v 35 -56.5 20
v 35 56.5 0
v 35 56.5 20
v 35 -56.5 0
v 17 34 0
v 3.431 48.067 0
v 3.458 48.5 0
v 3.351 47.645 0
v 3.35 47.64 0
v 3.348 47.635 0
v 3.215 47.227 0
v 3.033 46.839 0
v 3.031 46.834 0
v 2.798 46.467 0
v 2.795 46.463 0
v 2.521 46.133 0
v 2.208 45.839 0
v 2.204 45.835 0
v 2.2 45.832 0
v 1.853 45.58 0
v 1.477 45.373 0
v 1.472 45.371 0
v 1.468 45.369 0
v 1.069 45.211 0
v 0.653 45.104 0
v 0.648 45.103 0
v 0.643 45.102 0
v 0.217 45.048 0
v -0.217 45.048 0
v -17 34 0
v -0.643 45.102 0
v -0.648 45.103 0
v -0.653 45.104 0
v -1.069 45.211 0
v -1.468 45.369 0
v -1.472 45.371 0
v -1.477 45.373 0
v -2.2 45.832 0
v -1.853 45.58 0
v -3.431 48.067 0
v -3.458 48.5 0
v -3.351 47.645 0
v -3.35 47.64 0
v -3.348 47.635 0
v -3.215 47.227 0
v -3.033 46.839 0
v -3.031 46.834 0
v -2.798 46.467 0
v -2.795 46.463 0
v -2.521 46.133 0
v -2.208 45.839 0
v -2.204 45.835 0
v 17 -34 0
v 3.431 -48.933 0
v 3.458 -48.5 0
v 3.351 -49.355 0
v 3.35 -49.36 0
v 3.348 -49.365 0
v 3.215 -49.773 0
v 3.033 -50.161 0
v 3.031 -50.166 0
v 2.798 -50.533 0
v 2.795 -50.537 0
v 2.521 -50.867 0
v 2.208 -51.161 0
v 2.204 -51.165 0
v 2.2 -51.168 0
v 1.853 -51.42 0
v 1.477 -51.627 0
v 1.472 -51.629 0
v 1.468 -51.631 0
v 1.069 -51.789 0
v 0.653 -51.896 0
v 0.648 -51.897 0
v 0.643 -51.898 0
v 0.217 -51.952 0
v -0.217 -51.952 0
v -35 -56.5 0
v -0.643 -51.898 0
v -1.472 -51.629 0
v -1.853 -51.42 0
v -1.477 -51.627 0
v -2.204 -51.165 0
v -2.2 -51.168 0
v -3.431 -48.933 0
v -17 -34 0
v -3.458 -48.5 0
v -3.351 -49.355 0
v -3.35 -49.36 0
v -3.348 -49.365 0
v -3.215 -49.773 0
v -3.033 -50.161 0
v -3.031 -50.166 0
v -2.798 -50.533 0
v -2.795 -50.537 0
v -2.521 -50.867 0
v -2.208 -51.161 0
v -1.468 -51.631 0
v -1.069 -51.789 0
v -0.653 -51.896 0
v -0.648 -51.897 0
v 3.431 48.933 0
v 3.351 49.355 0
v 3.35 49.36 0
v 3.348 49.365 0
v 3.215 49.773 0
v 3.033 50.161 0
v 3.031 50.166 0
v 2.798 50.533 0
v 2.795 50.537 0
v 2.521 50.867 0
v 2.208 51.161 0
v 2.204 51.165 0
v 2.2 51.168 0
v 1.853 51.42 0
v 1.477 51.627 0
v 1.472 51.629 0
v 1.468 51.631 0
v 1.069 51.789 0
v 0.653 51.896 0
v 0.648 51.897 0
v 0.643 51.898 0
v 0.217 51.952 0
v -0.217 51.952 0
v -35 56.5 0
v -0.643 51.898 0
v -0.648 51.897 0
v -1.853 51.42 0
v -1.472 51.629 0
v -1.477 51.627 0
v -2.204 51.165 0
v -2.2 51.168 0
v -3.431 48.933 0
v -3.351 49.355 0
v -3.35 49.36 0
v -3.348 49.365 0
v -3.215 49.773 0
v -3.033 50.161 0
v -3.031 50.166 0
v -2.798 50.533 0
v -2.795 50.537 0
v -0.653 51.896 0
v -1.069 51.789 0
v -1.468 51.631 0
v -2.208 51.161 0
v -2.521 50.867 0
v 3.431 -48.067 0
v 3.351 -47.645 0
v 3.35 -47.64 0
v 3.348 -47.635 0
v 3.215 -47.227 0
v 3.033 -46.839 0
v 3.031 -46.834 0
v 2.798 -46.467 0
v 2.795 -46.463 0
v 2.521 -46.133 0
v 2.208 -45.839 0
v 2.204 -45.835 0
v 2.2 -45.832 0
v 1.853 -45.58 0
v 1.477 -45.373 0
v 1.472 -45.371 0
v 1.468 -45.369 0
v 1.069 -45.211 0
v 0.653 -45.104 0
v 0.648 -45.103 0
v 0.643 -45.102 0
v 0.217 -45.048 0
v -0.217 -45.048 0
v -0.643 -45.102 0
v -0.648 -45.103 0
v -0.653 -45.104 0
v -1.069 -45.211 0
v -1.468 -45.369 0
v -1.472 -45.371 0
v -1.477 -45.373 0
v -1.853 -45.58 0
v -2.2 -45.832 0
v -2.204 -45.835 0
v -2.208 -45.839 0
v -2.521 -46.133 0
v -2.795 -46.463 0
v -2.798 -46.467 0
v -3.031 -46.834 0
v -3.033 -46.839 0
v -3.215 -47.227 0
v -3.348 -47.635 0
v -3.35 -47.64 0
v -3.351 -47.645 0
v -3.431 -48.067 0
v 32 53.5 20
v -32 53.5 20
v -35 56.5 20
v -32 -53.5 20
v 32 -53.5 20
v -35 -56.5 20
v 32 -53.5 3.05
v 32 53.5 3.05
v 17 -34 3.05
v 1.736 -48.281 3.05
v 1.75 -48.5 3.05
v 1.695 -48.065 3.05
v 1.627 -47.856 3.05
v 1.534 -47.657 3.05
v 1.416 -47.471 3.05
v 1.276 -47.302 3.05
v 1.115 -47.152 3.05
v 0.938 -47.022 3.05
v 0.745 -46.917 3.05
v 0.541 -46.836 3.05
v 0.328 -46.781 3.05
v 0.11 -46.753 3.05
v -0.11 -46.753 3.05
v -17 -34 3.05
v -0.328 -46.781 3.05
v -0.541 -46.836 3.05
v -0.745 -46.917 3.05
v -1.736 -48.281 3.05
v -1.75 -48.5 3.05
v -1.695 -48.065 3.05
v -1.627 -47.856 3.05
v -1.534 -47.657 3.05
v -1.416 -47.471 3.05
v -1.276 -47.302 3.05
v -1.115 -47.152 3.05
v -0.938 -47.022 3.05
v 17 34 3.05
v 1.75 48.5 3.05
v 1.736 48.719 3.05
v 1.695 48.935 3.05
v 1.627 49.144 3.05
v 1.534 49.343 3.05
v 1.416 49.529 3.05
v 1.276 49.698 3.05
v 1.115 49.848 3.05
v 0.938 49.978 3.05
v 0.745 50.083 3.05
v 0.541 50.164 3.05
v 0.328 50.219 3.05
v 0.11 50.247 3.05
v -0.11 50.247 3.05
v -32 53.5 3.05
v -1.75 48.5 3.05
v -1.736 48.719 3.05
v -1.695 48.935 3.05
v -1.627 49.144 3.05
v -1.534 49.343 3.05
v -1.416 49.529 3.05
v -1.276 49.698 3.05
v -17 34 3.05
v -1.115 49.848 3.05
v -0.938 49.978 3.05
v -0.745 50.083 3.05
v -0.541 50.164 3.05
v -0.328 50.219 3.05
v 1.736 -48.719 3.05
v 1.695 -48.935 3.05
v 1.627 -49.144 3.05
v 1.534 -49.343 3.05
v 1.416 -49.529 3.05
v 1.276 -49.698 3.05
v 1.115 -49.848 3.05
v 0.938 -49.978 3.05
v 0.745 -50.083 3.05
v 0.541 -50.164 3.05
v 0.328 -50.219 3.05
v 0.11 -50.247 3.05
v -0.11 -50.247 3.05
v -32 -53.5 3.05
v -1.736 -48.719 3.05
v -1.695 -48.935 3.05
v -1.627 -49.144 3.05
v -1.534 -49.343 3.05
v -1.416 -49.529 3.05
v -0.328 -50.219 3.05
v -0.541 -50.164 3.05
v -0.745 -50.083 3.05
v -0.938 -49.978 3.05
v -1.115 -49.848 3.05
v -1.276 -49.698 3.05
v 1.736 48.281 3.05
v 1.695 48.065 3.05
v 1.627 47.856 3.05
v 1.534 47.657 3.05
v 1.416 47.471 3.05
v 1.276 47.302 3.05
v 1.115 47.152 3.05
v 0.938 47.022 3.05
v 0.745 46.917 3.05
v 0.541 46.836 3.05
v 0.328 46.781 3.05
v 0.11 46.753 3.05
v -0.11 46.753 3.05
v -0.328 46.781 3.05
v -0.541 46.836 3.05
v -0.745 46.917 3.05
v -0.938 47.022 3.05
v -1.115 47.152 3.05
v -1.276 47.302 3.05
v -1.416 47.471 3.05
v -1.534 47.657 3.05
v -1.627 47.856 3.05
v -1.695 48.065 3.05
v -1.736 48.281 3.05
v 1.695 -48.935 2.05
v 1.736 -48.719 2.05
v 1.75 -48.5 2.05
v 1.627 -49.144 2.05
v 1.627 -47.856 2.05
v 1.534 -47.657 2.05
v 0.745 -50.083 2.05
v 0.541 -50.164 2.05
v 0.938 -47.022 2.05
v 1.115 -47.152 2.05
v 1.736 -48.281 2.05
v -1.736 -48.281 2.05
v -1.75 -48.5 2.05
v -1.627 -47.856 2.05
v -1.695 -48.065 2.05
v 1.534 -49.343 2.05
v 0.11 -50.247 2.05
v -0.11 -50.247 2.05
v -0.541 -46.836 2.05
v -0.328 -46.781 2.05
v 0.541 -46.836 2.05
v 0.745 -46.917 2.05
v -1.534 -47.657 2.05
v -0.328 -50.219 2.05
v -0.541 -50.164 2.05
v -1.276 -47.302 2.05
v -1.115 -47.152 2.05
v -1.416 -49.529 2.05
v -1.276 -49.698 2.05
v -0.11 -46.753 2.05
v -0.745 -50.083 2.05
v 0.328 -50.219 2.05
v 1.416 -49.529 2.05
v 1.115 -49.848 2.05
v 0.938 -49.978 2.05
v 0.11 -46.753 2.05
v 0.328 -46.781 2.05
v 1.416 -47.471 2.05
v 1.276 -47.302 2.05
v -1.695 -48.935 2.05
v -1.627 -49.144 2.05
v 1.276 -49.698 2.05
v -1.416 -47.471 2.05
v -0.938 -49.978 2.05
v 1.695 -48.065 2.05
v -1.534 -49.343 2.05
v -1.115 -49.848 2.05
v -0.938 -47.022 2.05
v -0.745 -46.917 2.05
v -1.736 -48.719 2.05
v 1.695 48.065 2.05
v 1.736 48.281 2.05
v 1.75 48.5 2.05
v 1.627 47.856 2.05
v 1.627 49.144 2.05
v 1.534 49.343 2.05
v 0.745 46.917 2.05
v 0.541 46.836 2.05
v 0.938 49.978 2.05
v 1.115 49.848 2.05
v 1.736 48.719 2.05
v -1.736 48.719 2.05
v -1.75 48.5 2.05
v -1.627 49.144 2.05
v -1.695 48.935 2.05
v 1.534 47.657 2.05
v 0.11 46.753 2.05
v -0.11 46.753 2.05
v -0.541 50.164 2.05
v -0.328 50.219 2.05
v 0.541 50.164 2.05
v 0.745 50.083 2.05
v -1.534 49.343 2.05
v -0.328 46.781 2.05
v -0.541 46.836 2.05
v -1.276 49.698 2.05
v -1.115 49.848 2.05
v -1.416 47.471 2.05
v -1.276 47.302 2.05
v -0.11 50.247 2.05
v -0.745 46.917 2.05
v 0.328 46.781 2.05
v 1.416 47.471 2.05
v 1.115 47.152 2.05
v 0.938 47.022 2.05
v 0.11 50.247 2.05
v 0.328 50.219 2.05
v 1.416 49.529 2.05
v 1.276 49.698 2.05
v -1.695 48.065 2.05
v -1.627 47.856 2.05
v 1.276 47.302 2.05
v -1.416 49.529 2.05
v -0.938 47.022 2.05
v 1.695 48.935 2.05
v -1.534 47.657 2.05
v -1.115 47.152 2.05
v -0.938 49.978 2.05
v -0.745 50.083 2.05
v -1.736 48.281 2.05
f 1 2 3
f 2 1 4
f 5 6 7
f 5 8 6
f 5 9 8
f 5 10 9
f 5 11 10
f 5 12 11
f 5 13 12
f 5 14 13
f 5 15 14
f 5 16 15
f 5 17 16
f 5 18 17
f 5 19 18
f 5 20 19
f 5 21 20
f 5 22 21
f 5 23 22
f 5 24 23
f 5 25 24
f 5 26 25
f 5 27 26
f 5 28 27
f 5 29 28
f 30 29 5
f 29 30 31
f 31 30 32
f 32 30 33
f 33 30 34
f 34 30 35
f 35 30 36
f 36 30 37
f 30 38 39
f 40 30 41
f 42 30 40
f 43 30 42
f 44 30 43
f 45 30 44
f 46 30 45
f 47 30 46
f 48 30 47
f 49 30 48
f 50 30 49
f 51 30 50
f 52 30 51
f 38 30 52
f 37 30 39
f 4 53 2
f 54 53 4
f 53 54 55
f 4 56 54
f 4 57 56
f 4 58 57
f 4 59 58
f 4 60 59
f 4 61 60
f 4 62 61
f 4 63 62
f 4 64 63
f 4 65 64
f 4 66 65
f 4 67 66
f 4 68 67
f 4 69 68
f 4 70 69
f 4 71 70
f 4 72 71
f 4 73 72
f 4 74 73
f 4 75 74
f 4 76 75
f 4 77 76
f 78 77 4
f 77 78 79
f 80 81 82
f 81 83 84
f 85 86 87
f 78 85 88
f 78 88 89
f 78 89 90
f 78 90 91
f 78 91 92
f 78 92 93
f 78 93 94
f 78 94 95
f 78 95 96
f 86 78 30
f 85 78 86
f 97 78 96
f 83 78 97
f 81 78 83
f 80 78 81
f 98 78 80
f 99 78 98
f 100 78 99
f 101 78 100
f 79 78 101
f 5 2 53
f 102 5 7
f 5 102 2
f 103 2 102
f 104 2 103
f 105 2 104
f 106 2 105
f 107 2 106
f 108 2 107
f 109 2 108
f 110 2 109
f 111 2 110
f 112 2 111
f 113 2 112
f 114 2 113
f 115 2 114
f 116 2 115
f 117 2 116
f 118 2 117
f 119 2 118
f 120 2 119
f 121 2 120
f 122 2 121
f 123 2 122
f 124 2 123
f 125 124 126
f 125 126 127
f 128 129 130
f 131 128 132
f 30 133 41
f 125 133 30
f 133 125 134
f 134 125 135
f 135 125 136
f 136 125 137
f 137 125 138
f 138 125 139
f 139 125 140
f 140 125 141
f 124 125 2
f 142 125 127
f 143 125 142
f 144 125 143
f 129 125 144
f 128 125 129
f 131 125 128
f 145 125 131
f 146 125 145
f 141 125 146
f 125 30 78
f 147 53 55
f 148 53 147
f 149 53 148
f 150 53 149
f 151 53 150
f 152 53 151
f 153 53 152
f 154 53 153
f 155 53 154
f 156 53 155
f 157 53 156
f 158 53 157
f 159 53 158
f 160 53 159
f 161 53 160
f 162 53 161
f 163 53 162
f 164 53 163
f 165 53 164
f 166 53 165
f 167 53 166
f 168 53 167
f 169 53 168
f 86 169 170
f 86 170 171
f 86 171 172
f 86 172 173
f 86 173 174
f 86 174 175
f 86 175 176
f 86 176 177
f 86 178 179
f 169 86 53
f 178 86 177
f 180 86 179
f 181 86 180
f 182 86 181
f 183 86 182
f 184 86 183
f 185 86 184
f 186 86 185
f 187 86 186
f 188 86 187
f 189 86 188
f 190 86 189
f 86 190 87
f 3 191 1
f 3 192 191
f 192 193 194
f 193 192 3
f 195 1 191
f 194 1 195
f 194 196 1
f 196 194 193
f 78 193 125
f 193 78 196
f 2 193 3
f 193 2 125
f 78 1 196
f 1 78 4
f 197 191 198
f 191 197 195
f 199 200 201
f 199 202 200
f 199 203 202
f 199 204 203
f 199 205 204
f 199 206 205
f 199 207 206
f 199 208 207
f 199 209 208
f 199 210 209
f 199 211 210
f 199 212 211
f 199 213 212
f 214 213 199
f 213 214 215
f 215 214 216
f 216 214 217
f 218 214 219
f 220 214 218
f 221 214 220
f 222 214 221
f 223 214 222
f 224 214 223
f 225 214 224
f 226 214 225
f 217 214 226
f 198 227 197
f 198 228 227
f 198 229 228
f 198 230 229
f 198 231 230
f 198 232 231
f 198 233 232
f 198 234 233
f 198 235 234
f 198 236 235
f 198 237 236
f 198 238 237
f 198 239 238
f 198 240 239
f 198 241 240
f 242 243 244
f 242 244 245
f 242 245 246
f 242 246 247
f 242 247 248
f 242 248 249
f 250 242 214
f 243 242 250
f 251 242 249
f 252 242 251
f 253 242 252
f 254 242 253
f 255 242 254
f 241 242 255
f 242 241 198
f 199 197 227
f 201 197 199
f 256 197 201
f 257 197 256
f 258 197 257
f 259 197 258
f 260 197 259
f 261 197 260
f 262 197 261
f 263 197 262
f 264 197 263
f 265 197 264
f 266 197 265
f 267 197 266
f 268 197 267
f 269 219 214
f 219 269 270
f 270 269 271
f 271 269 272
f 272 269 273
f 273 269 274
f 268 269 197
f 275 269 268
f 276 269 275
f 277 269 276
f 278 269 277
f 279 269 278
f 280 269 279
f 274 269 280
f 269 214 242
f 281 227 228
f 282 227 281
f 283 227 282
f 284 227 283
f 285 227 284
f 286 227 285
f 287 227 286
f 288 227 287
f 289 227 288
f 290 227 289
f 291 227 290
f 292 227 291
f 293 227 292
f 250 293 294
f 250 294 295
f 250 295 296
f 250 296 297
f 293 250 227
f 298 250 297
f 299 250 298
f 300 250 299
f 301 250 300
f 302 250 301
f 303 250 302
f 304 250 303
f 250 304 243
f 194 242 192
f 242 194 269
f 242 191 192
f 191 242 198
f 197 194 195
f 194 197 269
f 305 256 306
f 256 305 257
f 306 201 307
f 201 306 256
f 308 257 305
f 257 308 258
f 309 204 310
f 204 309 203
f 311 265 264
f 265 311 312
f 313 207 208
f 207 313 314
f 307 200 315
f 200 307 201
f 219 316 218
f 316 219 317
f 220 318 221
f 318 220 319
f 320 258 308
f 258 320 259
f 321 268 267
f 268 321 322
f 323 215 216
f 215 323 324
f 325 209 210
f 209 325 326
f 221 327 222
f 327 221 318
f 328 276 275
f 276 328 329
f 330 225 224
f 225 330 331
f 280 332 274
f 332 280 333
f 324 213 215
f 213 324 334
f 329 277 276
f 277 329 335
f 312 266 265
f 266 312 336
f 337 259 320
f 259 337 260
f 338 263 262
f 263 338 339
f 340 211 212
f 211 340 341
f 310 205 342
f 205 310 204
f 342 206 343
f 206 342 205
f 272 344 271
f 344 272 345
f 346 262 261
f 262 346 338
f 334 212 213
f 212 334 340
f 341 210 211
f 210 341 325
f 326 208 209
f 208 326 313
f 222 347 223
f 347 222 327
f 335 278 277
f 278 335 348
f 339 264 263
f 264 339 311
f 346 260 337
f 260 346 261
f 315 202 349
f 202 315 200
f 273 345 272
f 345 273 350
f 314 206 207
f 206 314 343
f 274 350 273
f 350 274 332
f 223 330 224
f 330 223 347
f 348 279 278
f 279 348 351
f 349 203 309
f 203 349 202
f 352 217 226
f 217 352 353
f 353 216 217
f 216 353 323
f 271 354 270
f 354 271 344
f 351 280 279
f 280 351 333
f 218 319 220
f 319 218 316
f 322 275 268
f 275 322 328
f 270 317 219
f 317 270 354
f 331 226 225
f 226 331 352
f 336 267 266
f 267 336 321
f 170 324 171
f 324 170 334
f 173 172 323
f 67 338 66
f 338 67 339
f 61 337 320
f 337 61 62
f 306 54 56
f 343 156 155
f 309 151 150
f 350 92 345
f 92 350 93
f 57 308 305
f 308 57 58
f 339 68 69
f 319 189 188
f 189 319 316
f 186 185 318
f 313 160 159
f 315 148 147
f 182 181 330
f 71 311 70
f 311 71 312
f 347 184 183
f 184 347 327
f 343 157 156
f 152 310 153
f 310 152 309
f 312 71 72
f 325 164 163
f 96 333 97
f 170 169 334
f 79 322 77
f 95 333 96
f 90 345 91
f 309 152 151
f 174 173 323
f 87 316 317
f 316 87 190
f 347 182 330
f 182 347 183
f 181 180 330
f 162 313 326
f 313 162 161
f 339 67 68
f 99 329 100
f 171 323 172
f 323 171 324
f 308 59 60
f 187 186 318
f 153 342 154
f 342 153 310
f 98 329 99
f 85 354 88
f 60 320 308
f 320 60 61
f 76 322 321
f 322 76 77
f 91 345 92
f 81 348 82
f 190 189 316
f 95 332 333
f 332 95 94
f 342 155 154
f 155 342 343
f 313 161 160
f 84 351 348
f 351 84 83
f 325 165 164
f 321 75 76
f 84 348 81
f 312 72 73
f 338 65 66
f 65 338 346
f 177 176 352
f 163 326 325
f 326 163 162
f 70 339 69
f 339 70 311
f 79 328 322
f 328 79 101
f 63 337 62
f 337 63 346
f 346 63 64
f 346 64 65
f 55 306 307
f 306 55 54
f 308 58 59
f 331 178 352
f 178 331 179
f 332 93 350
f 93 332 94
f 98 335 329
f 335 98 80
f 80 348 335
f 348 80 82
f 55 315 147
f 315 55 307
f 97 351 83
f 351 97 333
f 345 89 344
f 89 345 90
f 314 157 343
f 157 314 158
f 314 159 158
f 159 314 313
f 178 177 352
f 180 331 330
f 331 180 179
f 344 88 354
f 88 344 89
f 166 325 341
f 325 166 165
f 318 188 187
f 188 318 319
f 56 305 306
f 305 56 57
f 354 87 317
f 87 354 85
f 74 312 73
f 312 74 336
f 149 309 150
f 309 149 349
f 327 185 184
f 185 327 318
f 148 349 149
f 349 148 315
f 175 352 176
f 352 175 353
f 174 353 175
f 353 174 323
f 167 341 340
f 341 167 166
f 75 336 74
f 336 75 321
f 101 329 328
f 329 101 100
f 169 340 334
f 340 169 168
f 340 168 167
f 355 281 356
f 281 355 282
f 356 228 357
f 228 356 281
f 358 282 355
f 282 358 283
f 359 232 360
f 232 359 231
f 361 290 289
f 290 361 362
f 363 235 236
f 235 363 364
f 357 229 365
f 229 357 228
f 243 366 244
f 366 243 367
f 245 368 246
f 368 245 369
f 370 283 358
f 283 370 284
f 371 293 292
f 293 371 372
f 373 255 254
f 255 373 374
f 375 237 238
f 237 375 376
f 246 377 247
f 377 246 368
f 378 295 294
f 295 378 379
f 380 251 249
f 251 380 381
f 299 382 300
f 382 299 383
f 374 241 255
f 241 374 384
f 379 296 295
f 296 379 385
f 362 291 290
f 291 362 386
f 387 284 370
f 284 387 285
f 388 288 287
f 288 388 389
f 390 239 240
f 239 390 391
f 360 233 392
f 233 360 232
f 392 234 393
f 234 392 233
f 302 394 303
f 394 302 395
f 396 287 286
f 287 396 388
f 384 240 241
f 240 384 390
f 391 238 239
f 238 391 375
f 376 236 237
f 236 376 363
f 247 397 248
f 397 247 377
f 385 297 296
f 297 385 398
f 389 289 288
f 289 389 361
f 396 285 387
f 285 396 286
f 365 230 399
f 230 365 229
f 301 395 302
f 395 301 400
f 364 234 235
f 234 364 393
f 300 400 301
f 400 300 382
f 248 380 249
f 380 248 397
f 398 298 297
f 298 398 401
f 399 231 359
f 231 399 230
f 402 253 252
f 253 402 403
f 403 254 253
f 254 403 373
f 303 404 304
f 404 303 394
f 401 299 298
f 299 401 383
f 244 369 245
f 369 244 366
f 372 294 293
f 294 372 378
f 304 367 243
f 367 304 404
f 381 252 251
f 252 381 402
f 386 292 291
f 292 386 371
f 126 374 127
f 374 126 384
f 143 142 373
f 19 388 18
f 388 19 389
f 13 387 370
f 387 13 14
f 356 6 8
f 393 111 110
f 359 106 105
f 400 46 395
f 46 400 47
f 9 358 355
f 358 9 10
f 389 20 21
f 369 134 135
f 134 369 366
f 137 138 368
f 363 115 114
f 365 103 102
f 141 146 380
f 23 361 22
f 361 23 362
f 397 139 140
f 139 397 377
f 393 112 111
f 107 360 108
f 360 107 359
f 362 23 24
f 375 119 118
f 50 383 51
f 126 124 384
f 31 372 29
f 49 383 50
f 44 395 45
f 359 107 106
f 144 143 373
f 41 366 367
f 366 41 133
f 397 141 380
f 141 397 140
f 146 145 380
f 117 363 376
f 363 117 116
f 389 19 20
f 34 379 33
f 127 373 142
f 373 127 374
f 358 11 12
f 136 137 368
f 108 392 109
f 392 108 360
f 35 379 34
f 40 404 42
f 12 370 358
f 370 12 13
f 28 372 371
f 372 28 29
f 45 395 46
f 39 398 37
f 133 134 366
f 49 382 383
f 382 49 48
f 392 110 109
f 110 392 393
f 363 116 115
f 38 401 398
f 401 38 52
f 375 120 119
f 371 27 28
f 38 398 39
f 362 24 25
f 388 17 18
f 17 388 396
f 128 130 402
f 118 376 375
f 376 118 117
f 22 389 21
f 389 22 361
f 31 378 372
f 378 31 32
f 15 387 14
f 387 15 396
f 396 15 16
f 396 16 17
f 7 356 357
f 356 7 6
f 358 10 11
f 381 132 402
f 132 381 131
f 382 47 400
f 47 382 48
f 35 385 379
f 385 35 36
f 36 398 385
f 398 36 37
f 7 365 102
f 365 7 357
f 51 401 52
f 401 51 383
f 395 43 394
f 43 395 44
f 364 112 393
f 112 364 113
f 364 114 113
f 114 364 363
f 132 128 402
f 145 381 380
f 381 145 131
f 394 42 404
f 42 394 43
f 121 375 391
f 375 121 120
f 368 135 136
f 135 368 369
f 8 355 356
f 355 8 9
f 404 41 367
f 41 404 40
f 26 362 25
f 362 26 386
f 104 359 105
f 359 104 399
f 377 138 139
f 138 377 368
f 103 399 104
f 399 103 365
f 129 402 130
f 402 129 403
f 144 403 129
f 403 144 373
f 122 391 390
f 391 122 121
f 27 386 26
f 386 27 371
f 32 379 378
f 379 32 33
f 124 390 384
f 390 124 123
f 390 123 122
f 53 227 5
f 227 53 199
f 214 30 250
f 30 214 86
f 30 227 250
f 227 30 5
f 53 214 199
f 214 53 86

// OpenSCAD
//Misengineered Light switch case
//Ari M. Diacou
//Feb 3, 2019

////////////////////// Libraries //////////////////////////
use <MCAD/metric_fastners.scad>
///////////////////// Parameters //////////////////////////
//of the wallplate (Parallel to gravity)
height=113;
//of the wallplate
width=70;
//of the wallplate (towards the wall)
depth=20;
//of the front face
thickness=3;
ep=0.05+0;
//the bolt hole diameter is US6 for elctrical bolts
US6=3.5;
//from the middle of the switch (this should not be changed for USA)
hole_offset=48.5;
//for the light switch (default is for a US rocker switch)
hole_dimensions=[34,68];

/* [Hidden] */
///////////////// Derived Parameters//////////////////////
cutout_dimensions=[hole_dimensions[0],hole_dimensions[1],2.1*depth];

/////////////////////// Main() ////////////////////////////
translate([0,0,depth]) mirror([0,0,1])
difference(){
    shell();
    cutout();
    holes();
    }
////////////////////// Modules ////////////////////////////
module cutout(){
    cube(cutout_dimensions,center=true);
    }

module shell(){
    translate(.5*[-width,-height])
    difference(){
        cube([width,height,depth]);
        translate([thickness,thickness,-ep])
        cube([width,height,depth]-thickness*[2,2,1]);
        }
    }

module holes(){
    translate([0,-hole_offset,depth+ep]) rotate([180,0,0]) csk_bolt(US6,depth);
    translate([0,hole_offset,depth+ep]) rotate([180,0,0]) csk_bolt(US6,depth);
    }
